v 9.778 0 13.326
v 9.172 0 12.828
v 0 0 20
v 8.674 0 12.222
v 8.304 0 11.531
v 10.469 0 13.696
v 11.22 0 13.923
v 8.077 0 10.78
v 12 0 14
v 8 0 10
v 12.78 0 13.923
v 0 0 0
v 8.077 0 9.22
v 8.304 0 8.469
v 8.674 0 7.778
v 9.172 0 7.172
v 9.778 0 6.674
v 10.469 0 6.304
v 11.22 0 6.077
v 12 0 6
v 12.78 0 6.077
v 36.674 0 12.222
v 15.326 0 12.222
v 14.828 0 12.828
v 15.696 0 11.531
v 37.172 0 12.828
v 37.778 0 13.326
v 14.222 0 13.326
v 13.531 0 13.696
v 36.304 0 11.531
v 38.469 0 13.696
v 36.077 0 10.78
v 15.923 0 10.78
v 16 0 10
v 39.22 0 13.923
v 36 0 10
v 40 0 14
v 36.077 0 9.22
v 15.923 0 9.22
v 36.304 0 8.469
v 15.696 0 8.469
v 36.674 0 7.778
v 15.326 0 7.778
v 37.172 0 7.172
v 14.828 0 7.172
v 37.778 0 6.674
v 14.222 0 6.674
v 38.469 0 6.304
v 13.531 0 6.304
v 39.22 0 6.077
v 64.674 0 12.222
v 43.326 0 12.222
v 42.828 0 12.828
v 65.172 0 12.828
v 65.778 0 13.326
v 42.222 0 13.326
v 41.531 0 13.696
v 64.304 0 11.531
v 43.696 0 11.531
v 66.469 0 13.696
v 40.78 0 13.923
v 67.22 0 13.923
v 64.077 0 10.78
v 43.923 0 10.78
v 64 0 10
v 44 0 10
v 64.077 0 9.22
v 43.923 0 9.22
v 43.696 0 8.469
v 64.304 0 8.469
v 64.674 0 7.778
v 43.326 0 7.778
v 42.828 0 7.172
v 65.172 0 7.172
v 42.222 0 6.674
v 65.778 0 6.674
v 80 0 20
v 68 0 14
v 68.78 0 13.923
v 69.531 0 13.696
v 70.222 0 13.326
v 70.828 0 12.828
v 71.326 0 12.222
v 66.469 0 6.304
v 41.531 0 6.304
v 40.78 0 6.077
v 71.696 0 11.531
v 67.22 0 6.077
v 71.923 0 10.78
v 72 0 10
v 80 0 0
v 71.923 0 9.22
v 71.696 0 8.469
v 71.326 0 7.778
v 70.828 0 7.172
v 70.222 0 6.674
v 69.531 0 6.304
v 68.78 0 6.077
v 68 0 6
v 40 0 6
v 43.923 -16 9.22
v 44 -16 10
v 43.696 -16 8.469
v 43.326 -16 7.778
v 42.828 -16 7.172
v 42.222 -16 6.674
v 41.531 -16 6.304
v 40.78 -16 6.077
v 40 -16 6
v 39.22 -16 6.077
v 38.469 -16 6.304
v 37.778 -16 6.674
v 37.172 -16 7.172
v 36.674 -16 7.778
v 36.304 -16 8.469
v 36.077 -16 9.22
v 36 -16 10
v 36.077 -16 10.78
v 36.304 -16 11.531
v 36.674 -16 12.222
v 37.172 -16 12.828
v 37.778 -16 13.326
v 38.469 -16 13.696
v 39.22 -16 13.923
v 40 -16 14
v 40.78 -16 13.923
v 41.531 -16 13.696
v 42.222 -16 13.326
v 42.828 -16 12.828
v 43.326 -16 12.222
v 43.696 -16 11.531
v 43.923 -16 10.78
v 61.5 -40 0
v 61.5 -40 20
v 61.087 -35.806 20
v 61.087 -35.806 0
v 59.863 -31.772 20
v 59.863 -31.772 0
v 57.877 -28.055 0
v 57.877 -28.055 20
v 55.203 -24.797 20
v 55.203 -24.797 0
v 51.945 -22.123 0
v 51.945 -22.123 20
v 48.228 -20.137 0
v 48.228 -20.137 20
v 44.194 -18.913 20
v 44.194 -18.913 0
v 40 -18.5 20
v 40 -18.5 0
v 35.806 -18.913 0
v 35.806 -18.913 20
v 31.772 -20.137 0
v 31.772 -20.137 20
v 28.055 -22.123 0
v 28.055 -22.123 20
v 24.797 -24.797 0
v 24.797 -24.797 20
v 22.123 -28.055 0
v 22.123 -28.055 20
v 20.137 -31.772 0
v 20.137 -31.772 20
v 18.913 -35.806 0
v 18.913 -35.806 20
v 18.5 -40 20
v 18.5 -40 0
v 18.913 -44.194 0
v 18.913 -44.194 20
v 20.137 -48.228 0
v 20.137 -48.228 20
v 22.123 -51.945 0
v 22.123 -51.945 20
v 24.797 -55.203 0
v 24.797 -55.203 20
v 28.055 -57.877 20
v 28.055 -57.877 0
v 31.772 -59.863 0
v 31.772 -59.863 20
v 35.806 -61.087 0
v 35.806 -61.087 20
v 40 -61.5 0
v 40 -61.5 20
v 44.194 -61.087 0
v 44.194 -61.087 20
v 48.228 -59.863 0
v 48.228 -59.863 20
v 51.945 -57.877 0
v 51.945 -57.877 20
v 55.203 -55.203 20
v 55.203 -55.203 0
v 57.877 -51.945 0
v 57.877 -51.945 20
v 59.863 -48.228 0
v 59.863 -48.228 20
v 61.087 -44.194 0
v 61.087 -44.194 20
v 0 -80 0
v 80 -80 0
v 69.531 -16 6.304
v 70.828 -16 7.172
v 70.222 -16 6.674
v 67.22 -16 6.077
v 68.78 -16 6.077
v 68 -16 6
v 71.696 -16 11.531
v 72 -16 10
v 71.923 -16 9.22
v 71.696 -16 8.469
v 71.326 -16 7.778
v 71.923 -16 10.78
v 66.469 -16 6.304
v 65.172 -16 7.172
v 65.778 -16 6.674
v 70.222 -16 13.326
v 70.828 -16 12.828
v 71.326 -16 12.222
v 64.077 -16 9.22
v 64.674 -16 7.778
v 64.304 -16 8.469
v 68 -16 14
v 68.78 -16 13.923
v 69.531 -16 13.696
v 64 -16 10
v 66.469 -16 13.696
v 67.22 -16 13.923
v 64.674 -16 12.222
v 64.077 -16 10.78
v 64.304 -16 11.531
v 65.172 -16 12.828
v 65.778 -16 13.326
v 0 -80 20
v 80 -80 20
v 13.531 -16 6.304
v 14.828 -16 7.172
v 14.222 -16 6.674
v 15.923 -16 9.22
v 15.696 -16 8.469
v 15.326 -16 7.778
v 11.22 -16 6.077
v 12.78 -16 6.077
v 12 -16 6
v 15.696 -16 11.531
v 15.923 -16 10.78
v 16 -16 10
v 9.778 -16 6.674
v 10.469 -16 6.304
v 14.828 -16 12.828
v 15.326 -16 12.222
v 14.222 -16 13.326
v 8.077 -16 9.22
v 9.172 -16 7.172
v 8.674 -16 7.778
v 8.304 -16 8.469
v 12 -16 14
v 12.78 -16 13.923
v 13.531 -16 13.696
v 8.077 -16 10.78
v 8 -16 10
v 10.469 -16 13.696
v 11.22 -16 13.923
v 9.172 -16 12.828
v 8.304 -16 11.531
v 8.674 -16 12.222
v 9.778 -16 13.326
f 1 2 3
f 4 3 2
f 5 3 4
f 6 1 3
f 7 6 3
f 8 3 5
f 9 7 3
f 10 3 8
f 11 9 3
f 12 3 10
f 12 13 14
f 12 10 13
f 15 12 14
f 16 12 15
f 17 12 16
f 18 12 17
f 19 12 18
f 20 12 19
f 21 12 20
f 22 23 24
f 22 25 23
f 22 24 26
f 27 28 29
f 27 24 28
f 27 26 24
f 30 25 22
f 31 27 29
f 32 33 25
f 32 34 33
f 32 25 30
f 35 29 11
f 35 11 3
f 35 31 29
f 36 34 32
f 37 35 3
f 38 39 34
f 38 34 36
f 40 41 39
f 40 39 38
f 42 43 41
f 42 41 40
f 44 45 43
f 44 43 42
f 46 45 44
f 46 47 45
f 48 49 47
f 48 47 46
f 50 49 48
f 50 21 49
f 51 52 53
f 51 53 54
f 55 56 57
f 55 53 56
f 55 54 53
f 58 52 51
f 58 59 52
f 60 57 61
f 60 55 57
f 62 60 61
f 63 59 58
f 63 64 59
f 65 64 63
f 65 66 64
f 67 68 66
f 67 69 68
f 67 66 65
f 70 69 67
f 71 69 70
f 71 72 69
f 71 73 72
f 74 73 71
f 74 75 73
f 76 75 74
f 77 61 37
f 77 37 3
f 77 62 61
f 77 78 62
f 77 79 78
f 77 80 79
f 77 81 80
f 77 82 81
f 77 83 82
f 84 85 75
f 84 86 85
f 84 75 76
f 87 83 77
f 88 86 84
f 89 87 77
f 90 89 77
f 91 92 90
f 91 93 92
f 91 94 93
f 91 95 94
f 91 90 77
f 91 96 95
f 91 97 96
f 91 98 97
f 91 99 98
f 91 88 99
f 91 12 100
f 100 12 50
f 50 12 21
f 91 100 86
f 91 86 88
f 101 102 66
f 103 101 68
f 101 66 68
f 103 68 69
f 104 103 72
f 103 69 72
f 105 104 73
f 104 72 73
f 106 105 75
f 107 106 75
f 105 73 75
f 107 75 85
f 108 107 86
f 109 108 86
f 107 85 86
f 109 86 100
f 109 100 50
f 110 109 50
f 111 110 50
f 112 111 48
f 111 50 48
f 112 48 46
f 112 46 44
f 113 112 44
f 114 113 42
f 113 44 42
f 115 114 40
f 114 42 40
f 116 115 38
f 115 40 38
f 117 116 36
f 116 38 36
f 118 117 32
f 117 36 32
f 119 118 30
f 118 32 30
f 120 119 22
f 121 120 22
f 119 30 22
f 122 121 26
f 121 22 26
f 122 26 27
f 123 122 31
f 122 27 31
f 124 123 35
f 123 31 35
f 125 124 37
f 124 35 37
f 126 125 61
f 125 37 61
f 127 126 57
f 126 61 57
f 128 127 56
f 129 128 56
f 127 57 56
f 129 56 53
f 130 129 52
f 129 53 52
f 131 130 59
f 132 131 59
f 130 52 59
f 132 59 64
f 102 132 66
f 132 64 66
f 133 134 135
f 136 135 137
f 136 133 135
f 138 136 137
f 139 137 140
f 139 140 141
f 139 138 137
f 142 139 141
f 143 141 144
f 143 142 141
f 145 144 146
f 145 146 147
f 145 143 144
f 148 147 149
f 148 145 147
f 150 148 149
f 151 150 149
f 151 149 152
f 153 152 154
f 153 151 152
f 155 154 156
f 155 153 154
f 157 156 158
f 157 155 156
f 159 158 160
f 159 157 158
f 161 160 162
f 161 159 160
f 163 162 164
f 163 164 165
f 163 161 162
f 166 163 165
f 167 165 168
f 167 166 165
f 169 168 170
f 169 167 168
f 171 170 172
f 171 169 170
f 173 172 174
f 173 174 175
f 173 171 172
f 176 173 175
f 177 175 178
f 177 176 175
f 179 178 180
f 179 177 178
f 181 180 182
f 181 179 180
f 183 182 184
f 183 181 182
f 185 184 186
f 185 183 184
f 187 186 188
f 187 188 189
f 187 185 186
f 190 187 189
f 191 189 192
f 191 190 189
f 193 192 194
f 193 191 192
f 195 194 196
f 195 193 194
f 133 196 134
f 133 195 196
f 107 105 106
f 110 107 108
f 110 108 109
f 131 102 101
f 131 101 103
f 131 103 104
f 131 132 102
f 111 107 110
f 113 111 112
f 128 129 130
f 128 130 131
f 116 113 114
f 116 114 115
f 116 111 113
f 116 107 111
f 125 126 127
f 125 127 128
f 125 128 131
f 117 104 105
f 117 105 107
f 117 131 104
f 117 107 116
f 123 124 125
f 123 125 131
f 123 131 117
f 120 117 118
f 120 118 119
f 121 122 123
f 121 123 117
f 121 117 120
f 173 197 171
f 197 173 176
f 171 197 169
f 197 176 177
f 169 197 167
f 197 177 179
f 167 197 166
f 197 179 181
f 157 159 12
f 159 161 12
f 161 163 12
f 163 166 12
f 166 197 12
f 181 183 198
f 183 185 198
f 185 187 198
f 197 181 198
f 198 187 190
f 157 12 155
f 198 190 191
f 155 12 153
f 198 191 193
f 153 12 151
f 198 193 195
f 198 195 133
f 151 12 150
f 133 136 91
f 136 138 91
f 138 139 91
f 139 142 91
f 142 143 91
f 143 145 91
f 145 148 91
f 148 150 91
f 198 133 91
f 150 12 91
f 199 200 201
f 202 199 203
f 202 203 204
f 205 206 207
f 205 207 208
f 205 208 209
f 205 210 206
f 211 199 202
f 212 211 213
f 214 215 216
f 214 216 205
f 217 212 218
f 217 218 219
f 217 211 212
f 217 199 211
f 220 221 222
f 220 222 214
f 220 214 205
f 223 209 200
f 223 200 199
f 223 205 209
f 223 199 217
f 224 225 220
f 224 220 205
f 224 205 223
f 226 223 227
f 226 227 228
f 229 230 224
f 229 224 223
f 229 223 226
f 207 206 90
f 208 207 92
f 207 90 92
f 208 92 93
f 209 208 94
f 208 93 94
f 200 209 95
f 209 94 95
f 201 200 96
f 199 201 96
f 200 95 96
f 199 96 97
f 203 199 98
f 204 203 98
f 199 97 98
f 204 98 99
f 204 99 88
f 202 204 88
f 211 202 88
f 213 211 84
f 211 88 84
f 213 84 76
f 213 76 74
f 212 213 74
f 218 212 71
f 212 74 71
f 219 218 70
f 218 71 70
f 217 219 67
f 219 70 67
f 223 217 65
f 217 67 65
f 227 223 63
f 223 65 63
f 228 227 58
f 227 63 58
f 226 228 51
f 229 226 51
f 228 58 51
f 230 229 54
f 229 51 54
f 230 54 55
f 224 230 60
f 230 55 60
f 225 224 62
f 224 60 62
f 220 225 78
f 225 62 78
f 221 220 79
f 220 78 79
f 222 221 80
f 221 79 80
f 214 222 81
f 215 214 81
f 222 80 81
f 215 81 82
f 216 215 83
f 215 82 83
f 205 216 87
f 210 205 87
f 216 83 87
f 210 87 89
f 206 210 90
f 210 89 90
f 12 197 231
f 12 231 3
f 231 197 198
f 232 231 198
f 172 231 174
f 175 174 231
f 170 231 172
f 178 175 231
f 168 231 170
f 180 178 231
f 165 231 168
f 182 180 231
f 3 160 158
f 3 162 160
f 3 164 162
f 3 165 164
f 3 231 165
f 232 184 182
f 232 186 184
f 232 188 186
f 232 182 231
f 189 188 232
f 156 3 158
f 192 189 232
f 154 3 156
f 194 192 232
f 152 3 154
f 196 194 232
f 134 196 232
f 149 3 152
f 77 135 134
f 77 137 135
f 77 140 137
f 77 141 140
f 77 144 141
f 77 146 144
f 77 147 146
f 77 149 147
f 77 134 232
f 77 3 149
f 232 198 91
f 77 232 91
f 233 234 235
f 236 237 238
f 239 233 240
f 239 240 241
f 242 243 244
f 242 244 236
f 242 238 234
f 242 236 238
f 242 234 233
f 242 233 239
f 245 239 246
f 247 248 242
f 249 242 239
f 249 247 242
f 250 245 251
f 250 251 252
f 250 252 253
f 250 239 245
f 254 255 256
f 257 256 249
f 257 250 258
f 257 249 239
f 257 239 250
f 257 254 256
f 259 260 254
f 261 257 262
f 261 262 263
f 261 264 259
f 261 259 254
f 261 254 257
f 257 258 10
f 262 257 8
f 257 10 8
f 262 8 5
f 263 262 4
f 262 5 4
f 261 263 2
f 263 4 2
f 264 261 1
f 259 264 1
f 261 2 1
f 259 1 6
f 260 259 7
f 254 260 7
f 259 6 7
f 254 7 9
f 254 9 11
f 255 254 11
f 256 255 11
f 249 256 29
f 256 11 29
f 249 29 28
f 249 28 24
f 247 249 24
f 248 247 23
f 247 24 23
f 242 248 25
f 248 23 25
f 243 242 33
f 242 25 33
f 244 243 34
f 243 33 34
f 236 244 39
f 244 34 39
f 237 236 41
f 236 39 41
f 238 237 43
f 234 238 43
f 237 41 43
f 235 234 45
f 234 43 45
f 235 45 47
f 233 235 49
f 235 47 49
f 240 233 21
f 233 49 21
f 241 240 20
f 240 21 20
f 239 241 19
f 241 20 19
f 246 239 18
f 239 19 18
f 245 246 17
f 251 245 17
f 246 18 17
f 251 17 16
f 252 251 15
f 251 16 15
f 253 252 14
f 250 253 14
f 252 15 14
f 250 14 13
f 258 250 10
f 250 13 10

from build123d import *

# Parameters (mm, degrees)
F0_W     = 80
F0_H     = 80
F0_R     = 21.5
F1_DEPTH = 20
F3_DEPTH = 16


with BuildPart() as f1:
    # F0 (on Top) → F1 (new body)
    with BuildSketch(Plane.XY):
        with Locations((40, -40)):
            Rectangle(F0_W, F0_H)
        with Locations((40, -40)):
            Circle(F0_R, mode=Mode.SUBTRACT)
    extrude(amount=F1_DEPTH)

    # F2 (on face) → F3 (cut)
    with BuildSketch(Plane(origin=(0, 0, 0), x_dir=(-1, 0, 0), z_dir=(0, 1, 0))):
        with BuildLine():
            ThreePointArc((-64, 10), (-68, 14), (-72, 10))
            Line((-72, 10), (-64, 10))
        make_face()
        with BuildLine():
            Line((-64, 10), (-72, 10))
            ThreePointArc((-72, 10), (-68, 6), (-64, 10))
        make_face()
        with BuildLine():
            ThreePointArc((-16, 10), (-12, 6), (-8, 10))
            Line((-8, 10), (-16, 10))
        make_face()
        with BuildLine():
            Line((-16, 10), (-8, 10))
            ThreePointArc((-8, 10), (-12, 14), (-16, 10))
        make_face()
        with BuildLine():
            Line((-44, 10), (-36, 10))
            ThreePointArc((-36, 10), (-40, 14), (-44, 10))
        make_face()
        with BuildLine():
            ThreePointArc((-44, 10), (-40, 6), (-36, 10))
            Line((-36, 10), (-44, 10))
        make_face()
    extrude(amount=-F3_DEPTH, mode=Mode.SUBTRACT)


solid = f1.part
